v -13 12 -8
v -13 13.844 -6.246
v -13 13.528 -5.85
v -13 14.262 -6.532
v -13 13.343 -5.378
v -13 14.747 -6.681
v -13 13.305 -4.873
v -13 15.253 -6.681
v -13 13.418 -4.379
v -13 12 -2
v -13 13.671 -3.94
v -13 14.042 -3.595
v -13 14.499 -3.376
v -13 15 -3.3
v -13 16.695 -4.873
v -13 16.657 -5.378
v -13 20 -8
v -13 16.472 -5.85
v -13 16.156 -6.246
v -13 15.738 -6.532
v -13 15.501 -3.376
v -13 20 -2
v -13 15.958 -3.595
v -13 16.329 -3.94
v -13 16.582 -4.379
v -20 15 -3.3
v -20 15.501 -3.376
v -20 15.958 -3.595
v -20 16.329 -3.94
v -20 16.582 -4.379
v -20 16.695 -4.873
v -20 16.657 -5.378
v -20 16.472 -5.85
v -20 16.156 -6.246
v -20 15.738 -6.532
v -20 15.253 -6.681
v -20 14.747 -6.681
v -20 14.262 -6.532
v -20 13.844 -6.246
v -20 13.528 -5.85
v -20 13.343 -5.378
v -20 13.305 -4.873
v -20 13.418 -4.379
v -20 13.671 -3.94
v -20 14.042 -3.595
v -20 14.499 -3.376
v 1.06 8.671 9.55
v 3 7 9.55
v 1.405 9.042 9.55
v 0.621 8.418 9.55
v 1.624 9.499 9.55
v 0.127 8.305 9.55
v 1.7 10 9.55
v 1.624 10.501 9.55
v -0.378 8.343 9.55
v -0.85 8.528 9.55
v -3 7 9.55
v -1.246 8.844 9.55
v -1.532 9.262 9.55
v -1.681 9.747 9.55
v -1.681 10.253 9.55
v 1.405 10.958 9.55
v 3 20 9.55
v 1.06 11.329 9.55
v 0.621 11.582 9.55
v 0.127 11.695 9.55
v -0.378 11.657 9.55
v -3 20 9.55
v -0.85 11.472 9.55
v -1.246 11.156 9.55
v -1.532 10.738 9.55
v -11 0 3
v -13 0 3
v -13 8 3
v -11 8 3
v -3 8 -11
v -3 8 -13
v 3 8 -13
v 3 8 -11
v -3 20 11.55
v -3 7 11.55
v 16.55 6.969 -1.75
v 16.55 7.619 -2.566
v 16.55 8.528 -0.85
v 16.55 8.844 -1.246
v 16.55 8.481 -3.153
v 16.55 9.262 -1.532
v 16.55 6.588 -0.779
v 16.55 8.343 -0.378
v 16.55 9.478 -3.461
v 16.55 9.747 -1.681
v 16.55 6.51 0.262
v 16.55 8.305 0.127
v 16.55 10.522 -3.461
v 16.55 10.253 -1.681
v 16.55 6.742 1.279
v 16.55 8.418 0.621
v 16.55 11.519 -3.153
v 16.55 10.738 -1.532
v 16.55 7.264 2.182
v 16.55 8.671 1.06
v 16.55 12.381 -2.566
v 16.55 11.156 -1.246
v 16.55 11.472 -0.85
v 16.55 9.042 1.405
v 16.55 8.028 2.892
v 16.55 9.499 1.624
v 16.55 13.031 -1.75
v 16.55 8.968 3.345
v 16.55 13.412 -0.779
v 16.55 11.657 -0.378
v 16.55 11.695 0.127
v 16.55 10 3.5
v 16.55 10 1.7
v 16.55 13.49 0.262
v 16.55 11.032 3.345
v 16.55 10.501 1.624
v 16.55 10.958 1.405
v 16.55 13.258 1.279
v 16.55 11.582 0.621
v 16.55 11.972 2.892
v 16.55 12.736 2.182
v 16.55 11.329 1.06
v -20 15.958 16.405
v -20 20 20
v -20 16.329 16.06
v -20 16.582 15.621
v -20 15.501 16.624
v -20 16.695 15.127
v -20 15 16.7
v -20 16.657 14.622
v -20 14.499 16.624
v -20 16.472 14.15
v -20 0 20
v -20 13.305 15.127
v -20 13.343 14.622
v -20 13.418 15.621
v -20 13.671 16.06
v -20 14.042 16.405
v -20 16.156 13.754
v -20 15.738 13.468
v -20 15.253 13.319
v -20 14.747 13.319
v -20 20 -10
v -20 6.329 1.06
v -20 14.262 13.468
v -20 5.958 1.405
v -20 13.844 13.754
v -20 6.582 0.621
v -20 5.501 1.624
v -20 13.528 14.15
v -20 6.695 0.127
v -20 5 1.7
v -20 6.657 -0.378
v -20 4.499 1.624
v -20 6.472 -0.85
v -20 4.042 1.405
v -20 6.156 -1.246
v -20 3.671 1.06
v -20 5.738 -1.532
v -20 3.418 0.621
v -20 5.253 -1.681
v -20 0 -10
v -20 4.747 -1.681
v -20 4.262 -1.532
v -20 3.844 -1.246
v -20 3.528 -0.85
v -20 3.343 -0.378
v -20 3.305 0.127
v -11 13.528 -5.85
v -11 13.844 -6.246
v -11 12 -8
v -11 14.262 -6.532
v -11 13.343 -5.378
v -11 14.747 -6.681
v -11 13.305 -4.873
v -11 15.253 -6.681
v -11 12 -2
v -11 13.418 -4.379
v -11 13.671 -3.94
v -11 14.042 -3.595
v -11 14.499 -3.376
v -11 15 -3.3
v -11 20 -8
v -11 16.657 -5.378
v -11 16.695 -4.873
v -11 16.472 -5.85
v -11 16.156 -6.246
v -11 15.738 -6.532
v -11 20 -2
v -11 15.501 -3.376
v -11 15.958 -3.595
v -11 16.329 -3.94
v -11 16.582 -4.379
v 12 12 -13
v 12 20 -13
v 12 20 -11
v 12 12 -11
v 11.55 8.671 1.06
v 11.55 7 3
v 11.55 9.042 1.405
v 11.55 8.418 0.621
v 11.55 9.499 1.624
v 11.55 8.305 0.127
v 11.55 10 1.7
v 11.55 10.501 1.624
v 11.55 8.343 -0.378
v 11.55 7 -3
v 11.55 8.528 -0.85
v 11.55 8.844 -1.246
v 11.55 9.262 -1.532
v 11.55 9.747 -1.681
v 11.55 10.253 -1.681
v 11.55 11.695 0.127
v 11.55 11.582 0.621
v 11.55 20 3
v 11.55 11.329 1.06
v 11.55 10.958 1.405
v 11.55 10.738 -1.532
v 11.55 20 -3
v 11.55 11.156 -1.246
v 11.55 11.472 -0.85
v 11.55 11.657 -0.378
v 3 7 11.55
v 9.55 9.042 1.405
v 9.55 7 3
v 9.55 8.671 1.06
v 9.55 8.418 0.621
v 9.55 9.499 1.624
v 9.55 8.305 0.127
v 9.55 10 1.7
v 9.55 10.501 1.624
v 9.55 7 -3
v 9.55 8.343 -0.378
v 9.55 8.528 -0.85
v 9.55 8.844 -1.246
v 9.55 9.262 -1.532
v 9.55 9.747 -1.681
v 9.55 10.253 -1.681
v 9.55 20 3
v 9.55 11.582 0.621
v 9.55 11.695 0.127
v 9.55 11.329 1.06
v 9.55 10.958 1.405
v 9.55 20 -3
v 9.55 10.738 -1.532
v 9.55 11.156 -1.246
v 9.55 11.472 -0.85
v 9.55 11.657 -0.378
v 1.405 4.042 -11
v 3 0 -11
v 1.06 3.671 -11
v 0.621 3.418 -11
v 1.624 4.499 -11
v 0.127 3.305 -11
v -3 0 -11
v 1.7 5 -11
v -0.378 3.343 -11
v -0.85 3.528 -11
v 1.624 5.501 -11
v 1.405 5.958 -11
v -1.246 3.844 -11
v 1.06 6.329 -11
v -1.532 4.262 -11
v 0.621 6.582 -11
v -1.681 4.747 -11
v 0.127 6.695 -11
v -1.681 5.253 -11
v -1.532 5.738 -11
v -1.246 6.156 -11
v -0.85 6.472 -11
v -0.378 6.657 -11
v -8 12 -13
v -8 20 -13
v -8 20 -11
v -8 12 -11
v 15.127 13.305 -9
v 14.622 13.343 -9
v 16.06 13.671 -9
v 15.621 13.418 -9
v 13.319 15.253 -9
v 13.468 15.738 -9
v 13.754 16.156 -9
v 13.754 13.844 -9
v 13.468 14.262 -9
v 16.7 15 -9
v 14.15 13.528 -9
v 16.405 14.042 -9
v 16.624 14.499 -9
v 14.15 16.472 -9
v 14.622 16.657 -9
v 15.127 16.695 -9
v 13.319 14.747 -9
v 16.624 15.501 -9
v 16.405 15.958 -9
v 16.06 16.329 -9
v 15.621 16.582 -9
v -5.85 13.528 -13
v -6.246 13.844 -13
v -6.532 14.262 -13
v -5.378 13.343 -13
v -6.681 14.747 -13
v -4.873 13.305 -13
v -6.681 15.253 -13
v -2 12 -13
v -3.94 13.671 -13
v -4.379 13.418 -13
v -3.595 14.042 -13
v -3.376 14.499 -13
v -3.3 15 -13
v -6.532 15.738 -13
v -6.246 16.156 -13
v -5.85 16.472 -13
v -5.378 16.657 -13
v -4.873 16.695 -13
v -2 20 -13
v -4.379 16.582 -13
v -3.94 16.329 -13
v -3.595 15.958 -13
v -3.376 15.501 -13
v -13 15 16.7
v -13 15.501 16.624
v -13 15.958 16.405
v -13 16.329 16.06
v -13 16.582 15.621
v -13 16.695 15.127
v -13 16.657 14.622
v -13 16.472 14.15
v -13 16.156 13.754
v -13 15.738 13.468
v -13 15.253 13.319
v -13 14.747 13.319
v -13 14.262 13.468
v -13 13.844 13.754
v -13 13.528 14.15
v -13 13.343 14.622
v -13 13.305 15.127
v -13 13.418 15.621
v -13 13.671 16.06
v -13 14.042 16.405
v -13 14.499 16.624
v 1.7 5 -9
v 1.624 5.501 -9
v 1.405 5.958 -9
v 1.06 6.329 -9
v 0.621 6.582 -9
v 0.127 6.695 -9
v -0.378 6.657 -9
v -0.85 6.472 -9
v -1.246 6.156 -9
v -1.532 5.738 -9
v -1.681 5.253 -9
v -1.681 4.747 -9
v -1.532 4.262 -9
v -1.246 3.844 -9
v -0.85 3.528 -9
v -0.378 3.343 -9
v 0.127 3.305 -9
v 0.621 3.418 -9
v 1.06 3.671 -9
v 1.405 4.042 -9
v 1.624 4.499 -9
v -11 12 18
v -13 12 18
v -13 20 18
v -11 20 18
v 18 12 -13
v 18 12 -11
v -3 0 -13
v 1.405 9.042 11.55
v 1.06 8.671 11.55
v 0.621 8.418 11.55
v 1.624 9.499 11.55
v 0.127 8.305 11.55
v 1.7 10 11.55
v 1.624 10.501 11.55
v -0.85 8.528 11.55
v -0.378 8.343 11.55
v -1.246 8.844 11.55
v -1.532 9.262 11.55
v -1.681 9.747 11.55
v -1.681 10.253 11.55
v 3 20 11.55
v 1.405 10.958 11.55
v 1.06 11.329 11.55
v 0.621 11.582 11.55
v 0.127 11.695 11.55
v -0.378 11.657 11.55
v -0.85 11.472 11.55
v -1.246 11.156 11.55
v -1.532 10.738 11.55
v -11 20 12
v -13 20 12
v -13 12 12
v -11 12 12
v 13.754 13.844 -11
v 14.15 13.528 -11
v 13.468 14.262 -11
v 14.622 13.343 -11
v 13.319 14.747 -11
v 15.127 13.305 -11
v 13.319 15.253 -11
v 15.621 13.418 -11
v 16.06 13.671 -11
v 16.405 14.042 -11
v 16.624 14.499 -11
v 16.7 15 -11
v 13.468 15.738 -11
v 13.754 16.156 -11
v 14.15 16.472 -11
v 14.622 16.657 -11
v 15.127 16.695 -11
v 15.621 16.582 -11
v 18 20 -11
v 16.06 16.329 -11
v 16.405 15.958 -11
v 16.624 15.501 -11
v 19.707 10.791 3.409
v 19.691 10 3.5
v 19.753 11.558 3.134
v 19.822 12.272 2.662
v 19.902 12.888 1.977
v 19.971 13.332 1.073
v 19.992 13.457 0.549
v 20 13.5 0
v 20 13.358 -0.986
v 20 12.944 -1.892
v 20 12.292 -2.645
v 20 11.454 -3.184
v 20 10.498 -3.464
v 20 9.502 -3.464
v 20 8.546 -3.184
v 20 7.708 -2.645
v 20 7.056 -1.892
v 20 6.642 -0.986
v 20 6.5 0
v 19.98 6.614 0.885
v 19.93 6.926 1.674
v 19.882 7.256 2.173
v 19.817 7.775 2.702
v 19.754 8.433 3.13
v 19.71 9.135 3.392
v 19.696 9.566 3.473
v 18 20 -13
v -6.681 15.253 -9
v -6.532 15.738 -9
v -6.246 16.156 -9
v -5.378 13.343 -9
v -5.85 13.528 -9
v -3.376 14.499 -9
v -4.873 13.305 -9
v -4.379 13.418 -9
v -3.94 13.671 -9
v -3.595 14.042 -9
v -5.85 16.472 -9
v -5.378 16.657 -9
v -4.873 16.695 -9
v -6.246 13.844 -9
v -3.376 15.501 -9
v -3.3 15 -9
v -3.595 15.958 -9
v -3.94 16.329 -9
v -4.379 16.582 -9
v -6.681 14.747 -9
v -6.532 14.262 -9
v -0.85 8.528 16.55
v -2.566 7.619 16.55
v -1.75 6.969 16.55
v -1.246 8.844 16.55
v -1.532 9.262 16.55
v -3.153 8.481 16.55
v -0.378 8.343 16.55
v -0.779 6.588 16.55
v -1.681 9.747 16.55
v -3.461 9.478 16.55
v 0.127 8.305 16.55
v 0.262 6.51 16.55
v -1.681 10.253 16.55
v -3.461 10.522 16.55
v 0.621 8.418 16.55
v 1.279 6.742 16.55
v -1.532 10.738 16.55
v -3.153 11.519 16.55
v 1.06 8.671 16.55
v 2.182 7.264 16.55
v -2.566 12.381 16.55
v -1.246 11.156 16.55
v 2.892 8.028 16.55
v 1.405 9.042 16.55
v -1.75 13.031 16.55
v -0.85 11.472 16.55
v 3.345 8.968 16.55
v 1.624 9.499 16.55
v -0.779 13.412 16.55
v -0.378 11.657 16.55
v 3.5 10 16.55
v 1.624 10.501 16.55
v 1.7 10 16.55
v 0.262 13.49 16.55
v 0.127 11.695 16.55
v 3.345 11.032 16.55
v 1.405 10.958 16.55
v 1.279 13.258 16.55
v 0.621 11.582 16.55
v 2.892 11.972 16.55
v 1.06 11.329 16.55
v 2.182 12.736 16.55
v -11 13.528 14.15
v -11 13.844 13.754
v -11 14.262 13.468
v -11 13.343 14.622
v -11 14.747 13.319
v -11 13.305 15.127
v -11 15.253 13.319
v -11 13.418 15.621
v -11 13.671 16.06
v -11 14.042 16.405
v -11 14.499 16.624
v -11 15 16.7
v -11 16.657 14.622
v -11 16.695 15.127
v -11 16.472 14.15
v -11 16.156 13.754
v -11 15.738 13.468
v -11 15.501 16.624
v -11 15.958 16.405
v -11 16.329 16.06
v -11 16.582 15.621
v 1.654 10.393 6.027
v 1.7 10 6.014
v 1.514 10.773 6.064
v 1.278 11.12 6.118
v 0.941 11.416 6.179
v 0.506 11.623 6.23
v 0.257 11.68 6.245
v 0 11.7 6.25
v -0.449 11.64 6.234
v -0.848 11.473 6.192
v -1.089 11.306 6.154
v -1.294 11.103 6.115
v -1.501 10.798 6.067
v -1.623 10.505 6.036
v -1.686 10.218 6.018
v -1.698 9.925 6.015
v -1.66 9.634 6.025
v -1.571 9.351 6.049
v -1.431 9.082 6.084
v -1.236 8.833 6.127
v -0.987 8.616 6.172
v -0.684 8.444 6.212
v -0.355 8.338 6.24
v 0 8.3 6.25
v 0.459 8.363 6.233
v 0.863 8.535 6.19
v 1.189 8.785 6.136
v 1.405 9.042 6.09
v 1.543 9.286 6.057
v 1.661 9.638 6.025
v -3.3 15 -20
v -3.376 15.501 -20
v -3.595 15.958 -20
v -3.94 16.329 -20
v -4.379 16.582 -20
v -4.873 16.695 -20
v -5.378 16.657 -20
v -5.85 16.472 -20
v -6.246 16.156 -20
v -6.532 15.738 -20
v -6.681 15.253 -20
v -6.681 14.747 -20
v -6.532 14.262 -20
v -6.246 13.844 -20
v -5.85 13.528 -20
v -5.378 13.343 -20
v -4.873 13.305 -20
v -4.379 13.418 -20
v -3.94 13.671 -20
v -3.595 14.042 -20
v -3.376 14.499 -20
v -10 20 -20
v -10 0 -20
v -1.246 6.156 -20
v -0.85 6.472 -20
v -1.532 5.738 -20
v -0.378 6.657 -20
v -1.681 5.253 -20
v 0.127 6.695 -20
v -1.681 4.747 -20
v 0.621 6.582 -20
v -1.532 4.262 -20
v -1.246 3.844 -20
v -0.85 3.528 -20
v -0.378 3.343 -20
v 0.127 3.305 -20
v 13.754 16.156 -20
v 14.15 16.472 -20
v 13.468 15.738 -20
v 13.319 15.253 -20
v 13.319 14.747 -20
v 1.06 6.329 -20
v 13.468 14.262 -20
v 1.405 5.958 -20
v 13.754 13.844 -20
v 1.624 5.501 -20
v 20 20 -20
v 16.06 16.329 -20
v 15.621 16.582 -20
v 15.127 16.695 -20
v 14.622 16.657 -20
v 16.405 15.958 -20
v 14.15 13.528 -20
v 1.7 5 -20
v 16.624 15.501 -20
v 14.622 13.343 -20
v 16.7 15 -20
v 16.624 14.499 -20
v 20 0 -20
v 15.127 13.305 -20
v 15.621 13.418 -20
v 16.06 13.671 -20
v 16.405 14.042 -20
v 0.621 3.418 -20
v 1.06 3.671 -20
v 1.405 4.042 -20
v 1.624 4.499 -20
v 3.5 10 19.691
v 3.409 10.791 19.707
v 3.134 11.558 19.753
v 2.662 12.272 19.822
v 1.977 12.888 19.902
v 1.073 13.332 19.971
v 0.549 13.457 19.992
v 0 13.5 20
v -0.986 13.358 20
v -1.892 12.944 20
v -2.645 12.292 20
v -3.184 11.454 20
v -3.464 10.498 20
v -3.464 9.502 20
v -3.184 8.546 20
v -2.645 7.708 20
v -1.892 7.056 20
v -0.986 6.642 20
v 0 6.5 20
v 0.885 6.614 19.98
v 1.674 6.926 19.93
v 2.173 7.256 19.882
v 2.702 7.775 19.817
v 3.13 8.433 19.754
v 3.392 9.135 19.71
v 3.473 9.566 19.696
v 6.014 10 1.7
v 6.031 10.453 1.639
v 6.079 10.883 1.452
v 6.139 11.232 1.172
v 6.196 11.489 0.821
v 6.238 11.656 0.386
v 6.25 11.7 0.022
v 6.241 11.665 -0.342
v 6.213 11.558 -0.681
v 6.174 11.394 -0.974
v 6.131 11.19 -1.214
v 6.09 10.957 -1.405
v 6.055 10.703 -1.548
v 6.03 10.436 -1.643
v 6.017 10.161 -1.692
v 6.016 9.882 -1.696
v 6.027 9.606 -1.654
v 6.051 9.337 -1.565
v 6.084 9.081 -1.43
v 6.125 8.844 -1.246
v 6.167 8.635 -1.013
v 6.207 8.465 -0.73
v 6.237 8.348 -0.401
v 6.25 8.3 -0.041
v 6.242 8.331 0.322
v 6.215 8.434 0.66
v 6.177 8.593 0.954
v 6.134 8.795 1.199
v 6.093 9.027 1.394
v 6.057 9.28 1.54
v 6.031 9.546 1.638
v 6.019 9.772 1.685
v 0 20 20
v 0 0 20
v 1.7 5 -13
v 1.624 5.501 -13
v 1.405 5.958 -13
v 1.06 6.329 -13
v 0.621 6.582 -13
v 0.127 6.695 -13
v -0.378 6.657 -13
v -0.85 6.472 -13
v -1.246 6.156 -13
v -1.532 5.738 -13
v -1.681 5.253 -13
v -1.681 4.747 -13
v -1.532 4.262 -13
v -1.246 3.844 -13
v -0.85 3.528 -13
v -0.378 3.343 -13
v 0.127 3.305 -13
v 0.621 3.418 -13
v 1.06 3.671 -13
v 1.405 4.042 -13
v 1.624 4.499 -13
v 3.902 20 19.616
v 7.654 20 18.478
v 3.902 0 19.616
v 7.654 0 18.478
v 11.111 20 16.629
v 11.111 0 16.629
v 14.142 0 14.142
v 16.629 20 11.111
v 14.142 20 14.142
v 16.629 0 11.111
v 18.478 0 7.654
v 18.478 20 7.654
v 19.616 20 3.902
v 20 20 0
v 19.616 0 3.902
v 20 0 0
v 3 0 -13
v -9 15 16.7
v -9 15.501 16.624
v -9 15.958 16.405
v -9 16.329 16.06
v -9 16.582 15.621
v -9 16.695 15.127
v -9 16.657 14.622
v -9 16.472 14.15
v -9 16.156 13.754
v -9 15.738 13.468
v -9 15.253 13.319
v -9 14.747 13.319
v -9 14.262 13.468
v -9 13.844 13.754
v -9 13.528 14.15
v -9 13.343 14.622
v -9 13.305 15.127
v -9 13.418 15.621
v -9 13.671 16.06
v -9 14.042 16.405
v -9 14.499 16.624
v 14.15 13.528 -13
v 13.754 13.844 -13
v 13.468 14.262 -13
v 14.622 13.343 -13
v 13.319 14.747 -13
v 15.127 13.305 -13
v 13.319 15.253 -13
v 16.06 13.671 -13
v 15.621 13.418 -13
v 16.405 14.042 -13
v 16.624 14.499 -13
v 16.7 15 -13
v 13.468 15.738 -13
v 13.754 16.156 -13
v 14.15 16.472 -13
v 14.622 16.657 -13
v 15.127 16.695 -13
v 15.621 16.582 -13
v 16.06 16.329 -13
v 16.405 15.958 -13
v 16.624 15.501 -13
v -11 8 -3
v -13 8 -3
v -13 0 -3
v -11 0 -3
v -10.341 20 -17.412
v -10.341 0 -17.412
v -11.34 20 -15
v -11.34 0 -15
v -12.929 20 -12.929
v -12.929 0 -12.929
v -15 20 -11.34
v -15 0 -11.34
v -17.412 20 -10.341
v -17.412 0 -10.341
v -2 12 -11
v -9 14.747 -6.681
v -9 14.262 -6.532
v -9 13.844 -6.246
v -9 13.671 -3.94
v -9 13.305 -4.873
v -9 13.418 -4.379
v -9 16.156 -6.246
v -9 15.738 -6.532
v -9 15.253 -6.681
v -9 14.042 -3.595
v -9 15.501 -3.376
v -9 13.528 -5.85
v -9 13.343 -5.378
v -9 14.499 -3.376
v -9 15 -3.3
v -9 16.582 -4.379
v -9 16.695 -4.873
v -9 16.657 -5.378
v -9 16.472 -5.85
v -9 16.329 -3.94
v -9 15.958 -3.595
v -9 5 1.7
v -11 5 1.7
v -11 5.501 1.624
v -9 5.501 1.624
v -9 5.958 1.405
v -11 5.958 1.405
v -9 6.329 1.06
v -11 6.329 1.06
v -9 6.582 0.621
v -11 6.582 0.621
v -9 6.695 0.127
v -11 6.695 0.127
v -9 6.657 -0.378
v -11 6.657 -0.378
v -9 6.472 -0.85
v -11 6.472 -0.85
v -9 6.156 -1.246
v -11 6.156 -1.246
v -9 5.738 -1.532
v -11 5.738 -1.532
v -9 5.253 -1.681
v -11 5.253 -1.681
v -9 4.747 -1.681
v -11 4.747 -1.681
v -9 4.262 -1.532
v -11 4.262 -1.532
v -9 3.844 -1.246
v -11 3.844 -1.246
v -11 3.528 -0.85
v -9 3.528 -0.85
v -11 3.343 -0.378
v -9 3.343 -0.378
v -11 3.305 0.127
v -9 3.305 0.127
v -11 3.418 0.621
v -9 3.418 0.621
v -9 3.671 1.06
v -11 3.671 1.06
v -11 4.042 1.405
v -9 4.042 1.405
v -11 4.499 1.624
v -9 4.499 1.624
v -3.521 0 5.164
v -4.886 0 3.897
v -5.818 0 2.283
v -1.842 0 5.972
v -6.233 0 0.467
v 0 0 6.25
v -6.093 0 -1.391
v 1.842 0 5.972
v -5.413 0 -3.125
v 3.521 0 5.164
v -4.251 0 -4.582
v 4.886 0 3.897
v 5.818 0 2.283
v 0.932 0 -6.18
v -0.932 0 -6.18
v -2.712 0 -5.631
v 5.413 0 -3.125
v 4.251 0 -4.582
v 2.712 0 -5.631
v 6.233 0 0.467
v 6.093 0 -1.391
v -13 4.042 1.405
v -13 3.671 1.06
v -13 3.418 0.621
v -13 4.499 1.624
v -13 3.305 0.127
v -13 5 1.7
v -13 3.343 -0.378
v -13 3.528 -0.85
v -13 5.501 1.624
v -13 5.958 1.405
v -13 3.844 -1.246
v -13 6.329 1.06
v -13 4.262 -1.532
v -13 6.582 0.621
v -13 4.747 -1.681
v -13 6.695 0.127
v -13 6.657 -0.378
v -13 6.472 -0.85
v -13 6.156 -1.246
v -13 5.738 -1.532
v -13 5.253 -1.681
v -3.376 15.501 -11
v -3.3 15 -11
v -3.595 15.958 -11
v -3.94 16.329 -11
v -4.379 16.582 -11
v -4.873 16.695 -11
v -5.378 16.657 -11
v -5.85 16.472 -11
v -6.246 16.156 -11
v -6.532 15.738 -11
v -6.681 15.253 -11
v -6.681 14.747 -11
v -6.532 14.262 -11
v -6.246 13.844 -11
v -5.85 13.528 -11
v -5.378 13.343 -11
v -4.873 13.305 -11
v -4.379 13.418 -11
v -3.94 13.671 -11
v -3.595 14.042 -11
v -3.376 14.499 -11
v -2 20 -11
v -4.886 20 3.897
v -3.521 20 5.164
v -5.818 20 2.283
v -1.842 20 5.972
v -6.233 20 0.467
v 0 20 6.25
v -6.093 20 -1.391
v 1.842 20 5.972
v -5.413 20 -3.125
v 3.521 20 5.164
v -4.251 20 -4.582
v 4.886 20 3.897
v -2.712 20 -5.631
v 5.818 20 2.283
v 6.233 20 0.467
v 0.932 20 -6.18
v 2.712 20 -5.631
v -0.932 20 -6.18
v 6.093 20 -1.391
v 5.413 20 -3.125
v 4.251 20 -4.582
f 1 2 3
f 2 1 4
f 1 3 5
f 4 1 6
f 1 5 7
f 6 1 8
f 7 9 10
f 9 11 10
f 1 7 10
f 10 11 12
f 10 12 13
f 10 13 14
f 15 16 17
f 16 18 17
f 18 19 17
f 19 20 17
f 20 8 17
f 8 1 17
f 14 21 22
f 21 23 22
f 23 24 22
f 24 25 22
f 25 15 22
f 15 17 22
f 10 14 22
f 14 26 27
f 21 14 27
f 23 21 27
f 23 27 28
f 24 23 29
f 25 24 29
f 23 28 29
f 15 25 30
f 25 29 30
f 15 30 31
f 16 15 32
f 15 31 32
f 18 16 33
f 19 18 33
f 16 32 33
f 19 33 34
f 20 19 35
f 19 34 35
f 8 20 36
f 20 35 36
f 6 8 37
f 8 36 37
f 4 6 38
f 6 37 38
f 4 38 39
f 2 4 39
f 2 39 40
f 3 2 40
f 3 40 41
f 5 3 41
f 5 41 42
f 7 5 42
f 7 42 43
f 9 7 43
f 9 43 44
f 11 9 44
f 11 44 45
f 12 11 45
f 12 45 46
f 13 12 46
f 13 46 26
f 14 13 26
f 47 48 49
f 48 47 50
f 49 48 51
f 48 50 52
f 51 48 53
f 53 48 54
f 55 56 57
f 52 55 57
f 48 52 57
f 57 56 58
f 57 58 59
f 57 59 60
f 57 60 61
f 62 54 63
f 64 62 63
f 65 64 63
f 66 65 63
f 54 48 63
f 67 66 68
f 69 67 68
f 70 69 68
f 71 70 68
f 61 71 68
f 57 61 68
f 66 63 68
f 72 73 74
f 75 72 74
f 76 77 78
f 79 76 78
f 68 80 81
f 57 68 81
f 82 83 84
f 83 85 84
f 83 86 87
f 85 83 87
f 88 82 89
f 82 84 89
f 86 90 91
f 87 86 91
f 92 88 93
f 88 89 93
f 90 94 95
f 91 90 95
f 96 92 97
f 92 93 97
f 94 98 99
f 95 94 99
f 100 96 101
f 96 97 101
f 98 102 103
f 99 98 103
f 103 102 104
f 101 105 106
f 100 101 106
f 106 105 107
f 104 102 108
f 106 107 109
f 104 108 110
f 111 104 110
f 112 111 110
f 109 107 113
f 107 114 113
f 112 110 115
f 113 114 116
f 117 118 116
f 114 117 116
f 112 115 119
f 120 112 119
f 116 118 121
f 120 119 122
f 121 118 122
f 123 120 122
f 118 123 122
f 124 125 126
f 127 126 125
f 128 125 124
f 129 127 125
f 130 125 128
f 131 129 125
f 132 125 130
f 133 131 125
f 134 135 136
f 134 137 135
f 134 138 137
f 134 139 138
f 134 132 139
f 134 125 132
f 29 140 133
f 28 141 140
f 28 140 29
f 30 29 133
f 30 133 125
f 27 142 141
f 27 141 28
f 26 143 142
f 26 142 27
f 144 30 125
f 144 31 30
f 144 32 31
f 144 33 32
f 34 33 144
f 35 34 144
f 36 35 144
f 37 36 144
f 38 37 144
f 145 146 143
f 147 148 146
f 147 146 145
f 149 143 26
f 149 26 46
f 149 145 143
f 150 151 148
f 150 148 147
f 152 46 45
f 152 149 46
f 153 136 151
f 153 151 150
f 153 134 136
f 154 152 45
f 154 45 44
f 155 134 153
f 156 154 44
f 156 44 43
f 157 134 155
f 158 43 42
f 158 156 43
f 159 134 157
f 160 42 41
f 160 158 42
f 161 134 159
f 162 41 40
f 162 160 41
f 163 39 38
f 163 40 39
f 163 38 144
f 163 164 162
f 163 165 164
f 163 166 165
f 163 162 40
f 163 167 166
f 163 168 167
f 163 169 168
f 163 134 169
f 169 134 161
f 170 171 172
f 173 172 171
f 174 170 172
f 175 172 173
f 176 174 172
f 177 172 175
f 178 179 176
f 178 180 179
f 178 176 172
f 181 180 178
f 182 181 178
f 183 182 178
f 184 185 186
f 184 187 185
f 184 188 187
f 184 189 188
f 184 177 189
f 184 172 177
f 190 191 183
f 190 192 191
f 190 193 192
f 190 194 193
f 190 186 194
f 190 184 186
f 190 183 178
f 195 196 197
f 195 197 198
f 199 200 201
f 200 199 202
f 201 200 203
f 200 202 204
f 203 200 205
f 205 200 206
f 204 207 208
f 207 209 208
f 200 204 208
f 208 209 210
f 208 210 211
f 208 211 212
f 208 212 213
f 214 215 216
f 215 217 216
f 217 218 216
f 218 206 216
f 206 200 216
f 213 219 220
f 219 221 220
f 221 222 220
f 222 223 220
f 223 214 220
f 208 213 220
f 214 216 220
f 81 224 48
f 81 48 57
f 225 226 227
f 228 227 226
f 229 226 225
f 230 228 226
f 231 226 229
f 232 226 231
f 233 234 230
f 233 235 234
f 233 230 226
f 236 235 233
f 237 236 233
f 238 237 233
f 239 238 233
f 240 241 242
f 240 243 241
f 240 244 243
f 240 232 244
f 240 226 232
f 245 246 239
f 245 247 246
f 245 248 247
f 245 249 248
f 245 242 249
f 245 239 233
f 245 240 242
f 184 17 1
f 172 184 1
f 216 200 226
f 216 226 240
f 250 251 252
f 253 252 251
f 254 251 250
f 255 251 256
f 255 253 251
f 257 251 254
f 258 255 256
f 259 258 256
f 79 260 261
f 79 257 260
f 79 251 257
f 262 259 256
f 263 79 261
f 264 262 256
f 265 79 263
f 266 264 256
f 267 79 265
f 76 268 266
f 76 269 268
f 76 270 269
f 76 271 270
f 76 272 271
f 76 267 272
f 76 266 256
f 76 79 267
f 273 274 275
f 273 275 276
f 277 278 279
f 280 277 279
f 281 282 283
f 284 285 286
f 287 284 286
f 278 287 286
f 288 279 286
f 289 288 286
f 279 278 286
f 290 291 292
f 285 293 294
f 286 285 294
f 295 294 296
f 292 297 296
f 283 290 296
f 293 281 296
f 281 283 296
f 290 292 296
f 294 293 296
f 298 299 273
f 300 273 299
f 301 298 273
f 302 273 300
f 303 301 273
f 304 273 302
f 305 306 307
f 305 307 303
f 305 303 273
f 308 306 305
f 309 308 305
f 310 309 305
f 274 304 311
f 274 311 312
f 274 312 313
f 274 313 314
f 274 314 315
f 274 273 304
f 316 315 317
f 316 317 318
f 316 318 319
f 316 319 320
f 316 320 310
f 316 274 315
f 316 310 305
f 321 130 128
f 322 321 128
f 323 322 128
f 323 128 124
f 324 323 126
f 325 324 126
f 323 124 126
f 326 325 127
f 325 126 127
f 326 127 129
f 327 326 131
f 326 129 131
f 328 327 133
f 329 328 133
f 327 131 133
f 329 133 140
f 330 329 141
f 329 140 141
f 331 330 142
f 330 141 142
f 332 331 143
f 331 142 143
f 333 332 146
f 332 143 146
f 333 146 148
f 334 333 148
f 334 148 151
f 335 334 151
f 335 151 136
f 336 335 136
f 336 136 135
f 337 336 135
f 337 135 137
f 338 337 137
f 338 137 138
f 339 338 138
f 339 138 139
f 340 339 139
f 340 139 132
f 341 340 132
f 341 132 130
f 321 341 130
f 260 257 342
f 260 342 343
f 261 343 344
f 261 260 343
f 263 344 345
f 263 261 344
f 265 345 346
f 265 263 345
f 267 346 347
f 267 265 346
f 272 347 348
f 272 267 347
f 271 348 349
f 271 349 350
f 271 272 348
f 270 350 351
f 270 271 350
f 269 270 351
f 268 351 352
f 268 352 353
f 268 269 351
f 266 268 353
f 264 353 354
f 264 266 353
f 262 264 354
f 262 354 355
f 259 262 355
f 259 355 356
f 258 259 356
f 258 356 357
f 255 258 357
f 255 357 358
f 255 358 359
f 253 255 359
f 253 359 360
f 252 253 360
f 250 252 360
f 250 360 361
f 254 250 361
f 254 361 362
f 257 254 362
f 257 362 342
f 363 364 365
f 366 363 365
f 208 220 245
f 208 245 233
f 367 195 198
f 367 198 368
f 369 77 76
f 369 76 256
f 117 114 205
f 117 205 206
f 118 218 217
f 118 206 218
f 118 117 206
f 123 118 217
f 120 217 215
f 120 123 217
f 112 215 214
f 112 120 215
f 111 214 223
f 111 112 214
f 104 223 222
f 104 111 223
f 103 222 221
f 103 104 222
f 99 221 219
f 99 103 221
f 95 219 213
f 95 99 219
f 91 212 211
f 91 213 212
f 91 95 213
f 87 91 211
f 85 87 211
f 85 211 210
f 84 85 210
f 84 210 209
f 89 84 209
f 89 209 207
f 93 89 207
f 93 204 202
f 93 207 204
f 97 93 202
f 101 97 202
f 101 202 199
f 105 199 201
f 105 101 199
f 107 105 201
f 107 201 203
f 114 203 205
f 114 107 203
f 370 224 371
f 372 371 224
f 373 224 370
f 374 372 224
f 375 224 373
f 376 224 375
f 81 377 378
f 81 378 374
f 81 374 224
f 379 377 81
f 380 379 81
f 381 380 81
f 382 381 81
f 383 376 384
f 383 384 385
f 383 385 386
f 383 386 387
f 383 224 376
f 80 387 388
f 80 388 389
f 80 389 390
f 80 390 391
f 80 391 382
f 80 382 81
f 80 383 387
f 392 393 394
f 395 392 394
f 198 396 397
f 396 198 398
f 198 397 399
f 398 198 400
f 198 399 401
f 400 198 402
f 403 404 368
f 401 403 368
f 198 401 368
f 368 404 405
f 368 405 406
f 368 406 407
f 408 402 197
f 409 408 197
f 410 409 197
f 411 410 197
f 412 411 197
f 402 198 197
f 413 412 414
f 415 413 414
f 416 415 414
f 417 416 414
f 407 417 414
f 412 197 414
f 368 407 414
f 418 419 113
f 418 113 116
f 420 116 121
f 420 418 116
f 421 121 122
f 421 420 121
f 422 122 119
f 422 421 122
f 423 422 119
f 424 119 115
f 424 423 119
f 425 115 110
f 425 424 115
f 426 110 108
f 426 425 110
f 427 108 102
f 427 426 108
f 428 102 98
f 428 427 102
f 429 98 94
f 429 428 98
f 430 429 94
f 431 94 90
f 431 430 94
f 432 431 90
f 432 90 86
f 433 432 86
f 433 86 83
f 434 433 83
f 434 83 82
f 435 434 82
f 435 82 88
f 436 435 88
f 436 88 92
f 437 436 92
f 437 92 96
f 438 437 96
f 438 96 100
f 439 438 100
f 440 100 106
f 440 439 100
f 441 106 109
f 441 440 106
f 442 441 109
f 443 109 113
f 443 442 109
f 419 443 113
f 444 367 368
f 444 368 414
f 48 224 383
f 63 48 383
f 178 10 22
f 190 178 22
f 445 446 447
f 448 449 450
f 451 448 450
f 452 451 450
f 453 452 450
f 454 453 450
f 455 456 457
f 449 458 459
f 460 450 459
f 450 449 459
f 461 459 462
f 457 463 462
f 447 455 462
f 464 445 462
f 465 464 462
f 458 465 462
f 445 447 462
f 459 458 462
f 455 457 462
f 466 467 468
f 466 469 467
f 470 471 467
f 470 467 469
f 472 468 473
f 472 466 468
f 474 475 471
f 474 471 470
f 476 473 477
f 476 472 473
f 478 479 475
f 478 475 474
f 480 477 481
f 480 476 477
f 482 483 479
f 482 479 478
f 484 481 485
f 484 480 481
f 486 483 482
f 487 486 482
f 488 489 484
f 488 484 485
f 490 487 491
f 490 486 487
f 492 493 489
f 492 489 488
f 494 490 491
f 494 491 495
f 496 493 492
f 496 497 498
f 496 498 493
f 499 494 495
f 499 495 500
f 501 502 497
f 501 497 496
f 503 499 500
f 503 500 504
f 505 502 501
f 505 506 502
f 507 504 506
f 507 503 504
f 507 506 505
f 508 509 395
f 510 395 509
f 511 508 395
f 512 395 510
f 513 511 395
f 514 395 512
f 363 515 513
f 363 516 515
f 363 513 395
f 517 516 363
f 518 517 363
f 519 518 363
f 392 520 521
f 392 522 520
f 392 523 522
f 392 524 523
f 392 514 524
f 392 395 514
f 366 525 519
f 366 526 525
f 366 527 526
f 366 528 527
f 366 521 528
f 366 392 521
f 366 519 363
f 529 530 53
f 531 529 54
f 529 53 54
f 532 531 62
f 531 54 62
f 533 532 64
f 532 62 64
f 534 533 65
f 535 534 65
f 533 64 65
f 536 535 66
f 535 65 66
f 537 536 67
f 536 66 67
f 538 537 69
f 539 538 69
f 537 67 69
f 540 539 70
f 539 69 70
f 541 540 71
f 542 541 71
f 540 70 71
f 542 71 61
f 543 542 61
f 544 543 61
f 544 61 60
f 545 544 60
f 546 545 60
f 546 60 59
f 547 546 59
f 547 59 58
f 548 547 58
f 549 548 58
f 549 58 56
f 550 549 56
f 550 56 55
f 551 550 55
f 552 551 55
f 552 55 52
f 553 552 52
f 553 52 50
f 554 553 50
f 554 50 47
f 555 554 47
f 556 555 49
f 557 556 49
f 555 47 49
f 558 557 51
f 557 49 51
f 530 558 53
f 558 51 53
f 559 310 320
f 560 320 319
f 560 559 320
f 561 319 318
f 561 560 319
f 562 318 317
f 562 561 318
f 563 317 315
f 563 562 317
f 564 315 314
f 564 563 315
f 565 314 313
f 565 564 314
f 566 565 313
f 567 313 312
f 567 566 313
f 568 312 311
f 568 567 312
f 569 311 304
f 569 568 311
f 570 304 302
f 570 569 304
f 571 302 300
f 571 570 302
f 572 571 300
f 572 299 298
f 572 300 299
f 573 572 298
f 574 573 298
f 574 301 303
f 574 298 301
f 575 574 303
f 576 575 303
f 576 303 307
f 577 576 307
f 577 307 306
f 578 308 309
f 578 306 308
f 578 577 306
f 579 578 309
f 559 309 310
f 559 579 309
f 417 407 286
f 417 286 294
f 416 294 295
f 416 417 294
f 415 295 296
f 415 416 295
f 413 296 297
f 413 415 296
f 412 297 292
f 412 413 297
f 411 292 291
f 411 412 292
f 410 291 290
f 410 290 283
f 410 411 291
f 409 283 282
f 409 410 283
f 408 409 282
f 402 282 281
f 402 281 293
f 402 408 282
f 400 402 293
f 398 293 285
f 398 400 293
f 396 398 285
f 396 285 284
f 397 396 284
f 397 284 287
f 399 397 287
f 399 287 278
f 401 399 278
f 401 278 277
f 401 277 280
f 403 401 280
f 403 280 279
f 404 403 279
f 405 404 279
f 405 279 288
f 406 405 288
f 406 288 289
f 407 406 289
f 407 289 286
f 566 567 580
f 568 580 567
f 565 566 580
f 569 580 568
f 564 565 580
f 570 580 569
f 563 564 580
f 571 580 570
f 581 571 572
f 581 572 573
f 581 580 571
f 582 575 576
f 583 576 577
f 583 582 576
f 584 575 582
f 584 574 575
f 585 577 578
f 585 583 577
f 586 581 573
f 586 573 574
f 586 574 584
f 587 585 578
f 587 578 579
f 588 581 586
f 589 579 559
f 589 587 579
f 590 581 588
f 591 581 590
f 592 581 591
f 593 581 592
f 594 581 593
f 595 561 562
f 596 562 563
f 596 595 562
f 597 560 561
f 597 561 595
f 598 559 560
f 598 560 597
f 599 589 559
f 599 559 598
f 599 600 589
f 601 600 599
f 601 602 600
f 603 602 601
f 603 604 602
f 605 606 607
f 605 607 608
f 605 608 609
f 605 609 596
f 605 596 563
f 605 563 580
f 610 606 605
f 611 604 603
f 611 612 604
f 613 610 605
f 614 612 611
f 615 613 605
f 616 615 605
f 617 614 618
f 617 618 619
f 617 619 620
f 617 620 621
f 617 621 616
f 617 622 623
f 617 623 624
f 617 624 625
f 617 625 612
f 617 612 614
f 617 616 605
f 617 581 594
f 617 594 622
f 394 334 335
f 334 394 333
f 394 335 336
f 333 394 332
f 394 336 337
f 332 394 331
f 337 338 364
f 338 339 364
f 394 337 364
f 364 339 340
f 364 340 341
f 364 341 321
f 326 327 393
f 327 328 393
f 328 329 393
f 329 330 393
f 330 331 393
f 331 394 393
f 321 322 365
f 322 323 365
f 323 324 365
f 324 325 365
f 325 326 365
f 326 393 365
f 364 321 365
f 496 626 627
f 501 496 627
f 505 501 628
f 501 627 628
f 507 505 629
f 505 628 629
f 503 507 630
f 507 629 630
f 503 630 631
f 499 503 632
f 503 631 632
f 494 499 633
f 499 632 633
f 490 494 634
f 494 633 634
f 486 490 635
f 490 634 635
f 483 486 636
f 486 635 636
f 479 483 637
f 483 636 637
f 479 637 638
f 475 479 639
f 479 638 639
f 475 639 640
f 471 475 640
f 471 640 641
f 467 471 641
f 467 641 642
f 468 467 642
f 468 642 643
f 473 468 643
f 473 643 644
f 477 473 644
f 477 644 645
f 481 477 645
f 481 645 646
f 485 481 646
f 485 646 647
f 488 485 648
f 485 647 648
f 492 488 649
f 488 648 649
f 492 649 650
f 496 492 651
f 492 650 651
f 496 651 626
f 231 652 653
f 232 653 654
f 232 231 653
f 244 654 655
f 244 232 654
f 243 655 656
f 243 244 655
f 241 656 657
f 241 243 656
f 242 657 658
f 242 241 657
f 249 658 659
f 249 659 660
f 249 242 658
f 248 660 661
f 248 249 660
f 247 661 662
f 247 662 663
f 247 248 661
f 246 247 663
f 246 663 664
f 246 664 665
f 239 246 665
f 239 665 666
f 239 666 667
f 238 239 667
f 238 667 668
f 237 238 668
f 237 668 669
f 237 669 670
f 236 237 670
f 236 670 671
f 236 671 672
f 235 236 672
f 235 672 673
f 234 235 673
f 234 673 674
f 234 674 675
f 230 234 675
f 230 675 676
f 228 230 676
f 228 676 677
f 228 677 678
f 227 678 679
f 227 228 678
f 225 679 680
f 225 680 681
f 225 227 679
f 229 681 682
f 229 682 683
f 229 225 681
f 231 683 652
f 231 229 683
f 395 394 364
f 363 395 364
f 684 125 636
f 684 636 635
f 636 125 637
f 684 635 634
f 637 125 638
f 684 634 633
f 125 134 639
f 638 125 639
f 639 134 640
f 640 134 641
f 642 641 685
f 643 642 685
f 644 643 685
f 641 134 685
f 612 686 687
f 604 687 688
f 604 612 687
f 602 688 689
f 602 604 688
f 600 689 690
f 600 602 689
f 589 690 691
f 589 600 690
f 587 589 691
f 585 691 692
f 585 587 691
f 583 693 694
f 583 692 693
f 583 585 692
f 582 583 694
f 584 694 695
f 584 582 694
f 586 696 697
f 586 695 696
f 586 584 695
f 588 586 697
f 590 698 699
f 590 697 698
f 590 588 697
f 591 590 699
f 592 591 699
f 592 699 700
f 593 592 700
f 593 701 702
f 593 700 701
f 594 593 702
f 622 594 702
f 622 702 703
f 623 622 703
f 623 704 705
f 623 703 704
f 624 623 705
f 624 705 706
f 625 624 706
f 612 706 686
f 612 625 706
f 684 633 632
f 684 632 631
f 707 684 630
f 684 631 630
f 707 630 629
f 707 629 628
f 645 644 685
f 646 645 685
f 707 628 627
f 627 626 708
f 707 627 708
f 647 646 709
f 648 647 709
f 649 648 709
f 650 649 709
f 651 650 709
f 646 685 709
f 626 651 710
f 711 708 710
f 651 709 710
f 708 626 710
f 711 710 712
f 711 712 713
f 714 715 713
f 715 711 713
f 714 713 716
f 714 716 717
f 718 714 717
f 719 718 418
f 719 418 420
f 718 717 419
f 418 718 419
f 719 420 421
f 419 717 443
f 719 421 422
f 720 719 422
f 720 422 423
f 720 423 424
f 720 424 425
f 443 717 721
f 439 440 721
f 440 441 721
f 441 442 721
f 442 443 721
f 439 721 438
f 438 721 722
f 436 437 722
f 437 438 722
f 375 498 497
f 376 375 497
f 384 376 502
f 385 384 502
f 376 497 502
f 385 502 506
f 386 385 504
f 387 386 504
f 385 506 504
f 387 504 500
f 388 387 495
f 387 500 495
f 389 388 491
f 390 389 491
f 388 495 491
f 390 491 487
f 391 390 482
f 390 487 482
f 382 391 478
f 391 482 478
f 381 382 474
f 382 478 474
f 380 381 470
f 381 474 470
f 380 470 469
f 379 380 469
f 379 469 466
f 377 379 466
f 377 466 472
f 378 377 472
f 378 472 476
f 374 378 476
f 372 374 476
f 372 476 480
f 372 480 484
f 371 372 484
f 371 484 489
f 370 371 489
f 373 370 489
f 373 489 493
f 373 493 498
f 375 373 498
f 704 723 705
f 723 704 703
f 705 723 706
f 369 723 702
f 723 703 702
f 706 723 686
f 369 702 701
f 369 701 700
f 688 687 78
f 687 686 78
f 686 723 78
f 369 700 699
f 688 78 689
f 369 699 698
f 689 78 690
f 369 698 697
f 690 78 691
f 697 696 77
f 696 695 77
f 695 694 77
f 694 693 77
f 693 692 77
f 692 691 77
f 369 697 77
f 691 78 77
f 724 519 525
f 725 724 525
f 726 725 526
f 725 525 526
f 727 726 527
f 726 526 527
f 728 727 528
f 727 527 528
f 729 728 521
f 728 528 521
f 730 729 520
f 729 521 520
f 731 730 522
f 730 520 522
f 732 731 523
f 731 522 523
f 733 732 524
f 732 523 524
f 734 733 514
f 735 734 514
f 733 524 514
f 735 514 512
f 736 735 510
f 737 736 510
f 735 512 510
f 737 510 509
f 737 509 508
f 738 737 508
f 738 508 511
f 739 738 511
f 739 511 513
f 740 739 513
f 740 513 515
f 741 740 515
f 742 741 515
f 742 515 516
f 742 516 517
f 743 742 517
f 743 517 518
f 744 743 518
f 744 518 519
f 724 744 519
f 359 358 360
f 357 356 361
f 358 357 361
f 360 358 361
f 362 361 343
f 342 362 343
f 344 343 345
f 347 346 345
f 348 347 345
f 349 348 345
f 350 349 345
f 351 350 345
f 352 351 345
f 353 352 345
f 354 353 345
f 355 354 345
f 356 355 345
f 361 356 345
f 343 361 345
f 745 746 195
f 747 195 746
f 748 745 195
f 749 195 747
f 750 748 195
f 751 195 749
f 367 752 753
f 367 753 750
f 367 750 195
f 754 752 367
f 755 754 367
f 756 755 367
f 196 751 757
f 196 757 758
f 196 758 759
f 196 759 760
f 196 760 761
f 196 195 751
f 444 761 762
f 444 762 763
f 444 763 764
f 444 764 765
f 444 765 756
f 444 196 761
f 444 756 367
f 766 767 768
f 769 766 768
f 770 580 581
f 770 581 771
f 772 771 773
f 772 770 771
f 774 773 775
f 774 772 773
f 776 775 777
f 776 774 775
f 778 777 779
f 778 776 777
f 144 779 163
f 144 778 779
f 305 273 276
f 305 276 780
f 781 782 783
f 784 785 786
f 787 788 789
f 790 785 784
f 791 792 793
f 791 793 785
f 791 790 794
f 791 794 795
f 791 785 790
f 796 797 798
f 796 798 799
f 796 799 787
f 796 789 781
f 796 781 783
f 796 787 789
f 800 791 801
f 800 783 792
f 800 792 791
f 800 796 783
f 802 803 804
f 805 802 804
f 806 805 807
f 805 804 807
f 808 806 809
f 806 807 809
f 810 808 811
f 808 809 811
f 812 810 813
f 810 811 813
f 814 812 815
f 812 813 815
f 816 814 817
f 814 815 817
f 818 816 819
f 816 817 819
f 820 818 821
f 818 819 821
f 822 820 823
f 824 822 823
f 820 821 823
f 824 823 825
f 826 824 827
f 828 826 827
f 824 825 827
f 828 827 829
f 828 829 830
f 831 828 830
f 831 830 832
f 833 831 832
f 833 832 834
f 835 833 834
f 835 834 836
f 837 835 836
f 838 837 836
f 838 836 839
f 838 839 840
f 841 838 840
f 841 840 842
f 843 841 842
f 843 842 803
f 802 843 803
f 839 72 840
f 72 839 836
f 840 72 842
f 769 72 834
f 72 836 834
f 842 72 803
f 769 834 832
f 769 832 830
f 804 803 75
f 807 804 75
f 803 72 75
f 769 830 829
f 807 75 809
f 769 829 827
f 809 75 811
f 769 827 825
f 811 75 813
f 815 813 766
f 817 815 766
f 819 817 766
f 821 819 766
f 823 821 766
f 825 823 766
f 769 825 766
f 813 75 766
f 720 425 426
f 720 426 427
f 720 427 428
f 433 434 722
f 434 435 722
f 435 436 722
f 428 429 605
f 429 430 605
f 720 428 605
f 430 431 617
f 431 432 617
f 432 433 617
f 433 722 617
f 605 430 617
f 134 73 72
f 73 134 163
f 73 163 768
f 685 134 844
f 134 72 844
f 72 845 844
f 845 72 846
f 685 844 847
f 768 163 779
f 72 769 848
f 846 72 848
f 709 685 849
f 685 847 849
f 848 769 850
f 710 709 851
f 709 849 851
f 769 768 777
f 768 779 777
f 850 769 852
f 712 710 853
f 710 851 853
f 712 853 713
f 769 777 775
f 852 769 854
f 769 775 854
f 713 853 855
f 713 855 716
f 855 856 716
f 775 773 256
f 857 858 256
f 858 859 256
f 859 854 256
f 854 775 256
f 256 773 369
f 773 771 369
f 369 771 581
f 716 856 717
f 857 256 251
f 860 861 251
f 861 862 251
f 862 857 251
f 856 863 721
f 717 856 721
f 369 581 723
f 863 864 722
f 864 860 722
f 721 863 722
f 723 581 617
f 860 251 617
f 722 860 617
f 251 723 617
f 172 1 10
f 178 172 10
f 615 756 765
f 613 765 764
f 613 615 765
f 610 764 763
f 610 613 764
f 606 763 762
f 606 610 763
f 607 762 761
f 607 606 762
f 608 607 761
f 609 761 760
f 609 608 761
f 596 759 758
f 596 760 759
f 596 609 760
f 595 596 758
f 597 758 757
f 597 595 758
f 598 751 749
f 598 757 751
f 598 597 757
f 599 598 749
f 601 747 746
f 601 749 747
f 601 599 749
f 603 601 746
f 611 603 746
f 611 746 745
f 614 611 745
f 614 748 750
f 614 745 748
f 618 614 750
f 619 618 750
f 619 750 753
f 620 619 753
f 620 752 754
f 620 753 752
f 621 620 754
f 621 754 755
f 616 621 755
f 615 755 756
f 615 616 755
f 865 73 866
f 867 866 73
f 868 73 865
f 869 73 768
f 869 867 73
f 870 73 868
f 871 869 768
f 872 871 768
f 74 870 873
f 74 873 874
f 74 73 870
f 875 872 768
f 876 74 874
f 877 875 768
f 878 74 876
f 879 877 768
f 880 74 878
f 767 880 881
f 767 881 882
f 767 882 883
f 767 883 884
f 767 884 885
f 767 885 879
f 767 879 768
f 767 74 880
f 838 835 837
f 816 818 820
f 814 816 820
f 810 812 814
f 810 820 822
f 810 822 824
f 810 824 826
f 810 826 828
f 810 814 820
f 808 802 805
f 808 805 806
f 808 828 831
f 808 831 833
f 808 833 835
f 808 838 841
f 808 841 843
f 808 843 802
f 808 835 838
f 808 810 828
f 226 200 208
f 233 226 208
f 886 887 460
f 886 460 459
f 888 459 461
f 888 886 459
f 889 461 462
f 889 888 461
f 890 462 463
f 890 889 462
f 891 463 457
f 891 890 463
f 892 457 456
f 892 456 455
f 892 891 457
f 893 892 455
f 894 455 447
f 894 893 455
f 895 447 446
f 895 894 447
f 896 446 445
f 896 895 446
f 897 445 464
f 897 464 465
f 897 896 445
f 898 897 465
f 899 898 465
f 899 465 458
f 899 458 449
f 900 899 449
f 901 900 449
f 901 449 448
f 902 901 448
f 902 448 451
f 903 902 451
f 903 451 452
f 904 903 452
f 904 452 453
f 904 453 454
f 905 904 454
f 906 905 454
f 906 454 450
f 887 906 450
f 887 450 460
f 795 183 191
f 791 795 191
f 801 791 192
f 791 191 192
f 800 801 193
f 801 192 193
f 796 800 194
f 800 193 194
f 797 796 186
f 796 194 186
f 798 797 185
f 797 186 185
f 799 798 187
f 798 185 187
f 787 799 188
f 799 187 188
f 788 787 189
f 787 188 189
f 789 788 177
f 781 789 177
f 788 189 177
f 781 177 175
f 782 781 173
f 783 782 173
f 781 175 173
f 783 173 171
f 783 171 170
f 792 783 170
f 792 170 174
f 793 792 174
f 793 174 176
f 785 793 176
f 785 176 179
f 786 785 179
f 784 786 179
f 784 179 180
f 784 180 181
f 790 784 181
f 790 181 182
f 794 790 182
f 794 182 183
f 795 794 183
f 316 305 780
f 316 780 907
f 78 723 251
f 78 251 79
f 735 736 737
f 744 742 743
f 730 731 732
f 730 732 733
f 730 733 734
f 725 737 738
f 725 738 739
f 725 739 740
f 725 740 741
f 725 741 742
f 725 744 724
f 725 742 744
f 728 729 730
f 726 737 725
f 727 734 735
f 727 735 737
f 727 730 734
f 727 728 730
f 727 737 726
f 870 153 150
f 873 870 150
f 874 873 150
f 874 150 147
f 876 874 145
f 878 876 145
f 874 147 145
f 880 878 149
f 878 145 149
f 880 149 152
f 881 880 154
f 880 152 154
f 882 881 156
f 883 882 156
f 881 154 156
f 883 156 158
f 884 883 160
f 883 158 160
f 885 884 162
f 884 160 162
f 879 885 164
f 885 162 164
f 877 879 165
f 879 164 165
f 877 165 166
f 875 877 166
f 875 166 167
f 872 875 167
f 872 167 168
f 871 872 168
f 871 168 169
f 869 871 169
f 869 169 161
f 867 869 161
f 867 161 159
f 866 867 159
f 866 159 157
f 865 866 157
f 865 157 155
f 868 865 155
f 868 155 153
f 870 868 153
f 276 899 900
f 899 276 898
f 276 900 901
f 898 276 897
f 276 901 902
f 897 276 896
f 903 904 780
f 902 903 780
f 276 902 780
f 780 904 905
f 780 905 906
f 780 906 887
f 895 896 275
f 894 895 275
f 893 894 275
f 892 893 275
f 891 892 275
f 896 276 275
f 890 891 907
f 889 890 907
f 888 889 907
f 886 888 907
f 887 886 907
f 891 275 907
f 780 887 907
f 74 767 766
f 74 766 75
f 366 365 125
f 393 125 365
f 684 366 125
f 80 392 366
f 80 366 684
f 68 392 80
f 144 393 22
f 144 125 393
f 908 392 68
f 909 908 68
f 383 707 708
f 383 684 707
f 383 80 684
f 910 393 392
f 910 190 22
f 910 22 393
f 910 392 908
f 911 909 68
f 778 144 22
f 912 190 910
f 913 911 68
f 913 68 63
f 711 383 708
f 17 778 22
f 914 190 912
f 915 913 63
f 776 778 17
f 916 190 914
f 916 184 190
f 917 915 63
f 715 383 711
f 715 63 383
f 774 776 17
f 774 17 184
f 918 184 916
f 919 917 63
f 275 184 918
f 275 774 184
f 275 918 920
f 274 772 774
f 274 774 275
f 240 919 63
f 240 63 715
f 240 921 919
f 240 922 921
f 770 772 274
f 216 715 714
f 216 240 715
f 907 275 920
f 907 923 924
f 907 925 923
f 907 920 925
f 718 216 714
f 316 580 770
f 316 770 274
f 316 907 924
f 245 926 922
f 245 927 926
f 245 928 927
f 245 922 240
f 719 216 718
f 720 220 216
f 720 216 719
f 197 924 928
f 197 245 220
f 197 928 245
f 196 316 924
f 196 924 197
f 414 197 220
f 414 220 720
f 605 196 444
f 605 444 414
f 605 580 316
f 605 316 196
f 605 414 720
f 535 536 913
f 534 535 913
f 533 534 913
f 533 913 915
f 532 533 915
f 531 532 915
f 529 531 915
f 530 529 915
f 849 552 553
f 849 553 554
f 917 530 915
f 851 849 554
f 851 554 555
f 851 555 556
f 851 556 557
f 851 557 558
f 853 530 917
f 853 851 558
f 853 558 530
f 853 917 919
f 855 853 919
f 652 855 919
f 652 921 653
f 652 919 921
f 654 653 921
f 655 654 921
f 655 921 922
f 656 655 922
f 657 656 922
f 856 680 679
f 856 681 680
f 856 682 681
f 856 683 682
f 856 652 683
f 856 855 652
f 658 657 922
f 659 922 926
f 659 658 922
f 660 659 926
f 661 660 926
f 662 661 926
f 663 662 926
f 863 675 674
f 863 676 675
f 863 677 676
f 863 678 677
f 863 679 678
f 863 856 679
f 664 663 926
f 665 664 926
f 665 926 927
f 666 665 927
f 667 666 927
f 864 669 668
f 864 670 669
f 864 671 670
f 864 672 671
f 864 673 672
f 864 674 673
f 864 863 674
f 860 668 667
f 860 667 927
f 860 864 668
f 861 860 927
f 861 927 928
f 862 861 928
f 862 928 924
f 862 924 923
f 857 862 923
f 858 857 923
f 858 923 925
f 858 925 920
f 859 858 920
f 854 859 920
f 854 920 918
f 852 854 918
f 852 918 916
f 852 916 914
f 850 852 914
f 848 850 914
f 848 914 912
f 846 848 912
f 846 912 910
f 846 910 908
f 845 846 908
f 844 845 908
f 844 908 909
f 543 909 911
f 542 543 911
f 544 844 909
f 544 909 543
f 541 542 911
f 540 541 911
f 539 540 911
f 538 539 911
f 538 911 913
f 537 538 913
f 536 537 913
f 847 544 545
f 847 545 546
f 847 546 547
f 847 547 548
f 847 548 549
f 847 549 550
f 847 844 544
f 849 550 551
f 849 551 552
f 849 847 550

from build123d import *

# Parameters (mm, degrees)
SKETCH1_W               = 40
SKETCH1_H               = 40
SKETCH1_R               = 6.25
BOSS_EXTRUDE1_DEPTH     = 20
SKETCH2_R               = 1.7
CUT_EXTRUDE1_DEPTH      = 11
CUT_EXTRUDE2_START      = -7
CUT_EXTRUDE2_DEPTH      = 2
CUT_EXTRUDE3_REACH      = 50.99
CUT_EXTRUDE3_END_RADIUS = 6.25
SKETCH4_R               = 1.7
CUT_EXTRUDE4_START      = -8.45
CUT_EXTRUDE4_DEPTH      = 2
SKETCH6_R               = 3.5
CUT_EXTRUDE5_DEPTH      = 3.45
FILLET1_R               = 20
CUT_EXTRUDE6_DEPTH      = 35.641016325


with BuildPart() as part:
    # Sketch1 → Boss-Extrude1 (new body)
    with BuildSketch(Plane(origin=(0, 0, 0), x_dir=(1, 0, 0), z_dir=(0, 1, 0))):
        Rectangle(SKETCH1_W, SKETCH1_H)
        with Locations(Location((0, 0, 0), (0, 0, 270))):
            Circle(SKETCH1_R, mode=Mode.SUBTRACT)
    extrude(amount=BOSS_EXTRUDE1_DEPTH)

    # Sketch2 → Cut-Extrude1 (cut)
    with BuildSketch(Plane.ZY.offset(20)):
        with Locations((-5, 15)):
            Circle(SKETCH2_R)
        with Locations((15, 15)):
            Circle(SKETCH2_R)
        with Locations((0, 5)):
            Circle(SKETCH2_R)
    cut_extrude1 = extrude(amount=-CUT_EXTRUDE1_DEPTH, mode=Mode.SUBTRACT)

    # Sketch3 → Cut-Extrude2 (cut)
    with BuildSketch(Plane.ZY.offset(20).offset(CUT_EXTRUDE2_START)):
        Polygon((-8, 12), (-2, 12), (-2, 18), (-2, 20), (-8, 20), (-8, 18), align=None)
        Polygon((12, 12), (18, 12), (18, 18), (18, 20), (12, 20), (12, 18), align=None)
        Polygon((-3, 8), (3, 8), (3, 2), (3, 0), (-3, 0), (-3, 2), align=None)
    cut_extrude2 = extrude(amount=-CUT_EXTRUDE2_DEPTH, mode=Mode.SUBTRACT)

    # Cut-Extrude3: up to this cylinder (the profile starts outside it)
    cut_extrude3_end = Plane(origin=(0, 10, 0), z_dir=(0, -1, 0)) * Cylinder(CUT_EXTRUDE3_END_RADIUS, 115.48, mode=Mode.PRIVATE)
    # Sketch4 → Cut-Extrude3 (cut, up to the surface)
    with BuildSketch(Plane.XY.offset(20), mode=Mode.PRIVATE) as cut_extrude3_sk1:
        with Locations((0, 10)):
            Circle(SKETCH4_R)
    cut_extrude3_tool1 = extrude(cut_extrude3_sk1.sketch, amount=-CUT_EXTRUDE3_REACH, mode=Mode.PRIVATE) - cut_extrude3_end
    cut_extrude3 = cut_extrude3_tool1.solids().sort_by_distance((0, 10, 20))[0]
    add(cut_extrude3, mode=Mode.SUBTRACT)

    # Sketch5 → Cut-Extrude4 (cut)
    with BuildSketch(Plane.XY.offset(20).offset(CUT_EXTRUDE4_START)):
        Polygon((-3, 13), (-3, 20), (3, 20), (3, 13), (3, 7), (-3, 7), align=None)
    cut_extrude4 = extrude(amount=-CUT_EXTRUDE4_DEPTH, mode=Mode.SUBTRACT)

    # Sketch6 → Cut-Extrude5 (cut)
    with BuildSketch(Plane.XY.offset(20)):
        with Locations((0, 10)):
            Circle(SKETCH6_R)
    cut_extrude5 = extrude(amount=-CUT_EXTRUDE5_DEPTH, mode=Mode.SUBTRACT)

    # Mirror1: Cut-Extrude1, Cut-Extrude2, Cut-Extrude3, Cut-Extrude4, Cut-Extrude5 across plane
    add(cut_extrude1.mirror(Plane(origin=(0, 0, 0), x_dir=(0.7071067811865476, 0, 0.7071067811865476), z_dir=(-0.7071067811865477, 0, 0.7071067811865475))), mode=Mode.SUBTRACT)
    add(cut_extrude2.mirror(Plane(origin=(0, 0, 0), x_dir=(0.7071067811865476, 0, 0.7071067811865476), z_dir=(-0.7071067811865477, 0, 0.7071067811865475))), mode=Mode.SUBTRACT)
    add(cut_extrude3.mirror(Plane(origin=(0, 0, 0), x_dir=(0.7071067811865476, 0, 0.7071067811865476), z_dir=(-0.7071067811865477, 0, 0.7071067811865475))), mode=Mode.SUBTRACT)
    add(cut_extrude4.mirror(Plane(origin=(0, 0, 0), x_dir=(0.7071067811865476, 0, 0.7071067811865476), z_dir=(-0.7071067811865477, 0, 0.7071067811865475))), mode=Mode.SUBTRACT)
    add(cut_extrude5.mirror(Plane(origin=(0, 0, 0), x_dir=(0.7071067811865476, 0, 0.7071067811865476), z_dir=(-0.7071067811865477, 0, 0.7071067811865475))), mode=Mode.SUBTRACT)

    # Fillet1
    # the kernel refuses this fillet: 20 mm, written as the material it takes off along each edge
    with BuildSketch(Plane(origin=(20, -50, 20), x_dir=(-1, 0, 0), z_dir=(0, 1, 0))) as fillet1_piece_1:
        with BuildLine():
            CenterArc((FILLET1_R, -FILLET1_R), FILLET1_R, 90, 90)
            Line((0, -FILLET1_R), (0, 0))
            Line((0, 0), (FILLET1_R, 0))
        make_face()
    extrude(amount=120, mode=Mode.SUBTRACT)

    # Sketch7 → Cut-Extrude6 (cut, through all)
    with BuildSketch(Plane(origin=(0, 20, 0), x_dir=(1, 0, 0), z_dir=(0, 1, 0))):
        with BuildLine():
            Line((-20, 10), (-20, 20))
            Line((-20, 20), (-10, 20))
            ThreePointArc((-10, 20), (-12.928932188, 12.928932188), (-20, 10))
        make_face()
    extrude(amount=-CUT_EXTRUDE6_DEPTH, mode=Mode.SUBTRACT)


solid = part.part
